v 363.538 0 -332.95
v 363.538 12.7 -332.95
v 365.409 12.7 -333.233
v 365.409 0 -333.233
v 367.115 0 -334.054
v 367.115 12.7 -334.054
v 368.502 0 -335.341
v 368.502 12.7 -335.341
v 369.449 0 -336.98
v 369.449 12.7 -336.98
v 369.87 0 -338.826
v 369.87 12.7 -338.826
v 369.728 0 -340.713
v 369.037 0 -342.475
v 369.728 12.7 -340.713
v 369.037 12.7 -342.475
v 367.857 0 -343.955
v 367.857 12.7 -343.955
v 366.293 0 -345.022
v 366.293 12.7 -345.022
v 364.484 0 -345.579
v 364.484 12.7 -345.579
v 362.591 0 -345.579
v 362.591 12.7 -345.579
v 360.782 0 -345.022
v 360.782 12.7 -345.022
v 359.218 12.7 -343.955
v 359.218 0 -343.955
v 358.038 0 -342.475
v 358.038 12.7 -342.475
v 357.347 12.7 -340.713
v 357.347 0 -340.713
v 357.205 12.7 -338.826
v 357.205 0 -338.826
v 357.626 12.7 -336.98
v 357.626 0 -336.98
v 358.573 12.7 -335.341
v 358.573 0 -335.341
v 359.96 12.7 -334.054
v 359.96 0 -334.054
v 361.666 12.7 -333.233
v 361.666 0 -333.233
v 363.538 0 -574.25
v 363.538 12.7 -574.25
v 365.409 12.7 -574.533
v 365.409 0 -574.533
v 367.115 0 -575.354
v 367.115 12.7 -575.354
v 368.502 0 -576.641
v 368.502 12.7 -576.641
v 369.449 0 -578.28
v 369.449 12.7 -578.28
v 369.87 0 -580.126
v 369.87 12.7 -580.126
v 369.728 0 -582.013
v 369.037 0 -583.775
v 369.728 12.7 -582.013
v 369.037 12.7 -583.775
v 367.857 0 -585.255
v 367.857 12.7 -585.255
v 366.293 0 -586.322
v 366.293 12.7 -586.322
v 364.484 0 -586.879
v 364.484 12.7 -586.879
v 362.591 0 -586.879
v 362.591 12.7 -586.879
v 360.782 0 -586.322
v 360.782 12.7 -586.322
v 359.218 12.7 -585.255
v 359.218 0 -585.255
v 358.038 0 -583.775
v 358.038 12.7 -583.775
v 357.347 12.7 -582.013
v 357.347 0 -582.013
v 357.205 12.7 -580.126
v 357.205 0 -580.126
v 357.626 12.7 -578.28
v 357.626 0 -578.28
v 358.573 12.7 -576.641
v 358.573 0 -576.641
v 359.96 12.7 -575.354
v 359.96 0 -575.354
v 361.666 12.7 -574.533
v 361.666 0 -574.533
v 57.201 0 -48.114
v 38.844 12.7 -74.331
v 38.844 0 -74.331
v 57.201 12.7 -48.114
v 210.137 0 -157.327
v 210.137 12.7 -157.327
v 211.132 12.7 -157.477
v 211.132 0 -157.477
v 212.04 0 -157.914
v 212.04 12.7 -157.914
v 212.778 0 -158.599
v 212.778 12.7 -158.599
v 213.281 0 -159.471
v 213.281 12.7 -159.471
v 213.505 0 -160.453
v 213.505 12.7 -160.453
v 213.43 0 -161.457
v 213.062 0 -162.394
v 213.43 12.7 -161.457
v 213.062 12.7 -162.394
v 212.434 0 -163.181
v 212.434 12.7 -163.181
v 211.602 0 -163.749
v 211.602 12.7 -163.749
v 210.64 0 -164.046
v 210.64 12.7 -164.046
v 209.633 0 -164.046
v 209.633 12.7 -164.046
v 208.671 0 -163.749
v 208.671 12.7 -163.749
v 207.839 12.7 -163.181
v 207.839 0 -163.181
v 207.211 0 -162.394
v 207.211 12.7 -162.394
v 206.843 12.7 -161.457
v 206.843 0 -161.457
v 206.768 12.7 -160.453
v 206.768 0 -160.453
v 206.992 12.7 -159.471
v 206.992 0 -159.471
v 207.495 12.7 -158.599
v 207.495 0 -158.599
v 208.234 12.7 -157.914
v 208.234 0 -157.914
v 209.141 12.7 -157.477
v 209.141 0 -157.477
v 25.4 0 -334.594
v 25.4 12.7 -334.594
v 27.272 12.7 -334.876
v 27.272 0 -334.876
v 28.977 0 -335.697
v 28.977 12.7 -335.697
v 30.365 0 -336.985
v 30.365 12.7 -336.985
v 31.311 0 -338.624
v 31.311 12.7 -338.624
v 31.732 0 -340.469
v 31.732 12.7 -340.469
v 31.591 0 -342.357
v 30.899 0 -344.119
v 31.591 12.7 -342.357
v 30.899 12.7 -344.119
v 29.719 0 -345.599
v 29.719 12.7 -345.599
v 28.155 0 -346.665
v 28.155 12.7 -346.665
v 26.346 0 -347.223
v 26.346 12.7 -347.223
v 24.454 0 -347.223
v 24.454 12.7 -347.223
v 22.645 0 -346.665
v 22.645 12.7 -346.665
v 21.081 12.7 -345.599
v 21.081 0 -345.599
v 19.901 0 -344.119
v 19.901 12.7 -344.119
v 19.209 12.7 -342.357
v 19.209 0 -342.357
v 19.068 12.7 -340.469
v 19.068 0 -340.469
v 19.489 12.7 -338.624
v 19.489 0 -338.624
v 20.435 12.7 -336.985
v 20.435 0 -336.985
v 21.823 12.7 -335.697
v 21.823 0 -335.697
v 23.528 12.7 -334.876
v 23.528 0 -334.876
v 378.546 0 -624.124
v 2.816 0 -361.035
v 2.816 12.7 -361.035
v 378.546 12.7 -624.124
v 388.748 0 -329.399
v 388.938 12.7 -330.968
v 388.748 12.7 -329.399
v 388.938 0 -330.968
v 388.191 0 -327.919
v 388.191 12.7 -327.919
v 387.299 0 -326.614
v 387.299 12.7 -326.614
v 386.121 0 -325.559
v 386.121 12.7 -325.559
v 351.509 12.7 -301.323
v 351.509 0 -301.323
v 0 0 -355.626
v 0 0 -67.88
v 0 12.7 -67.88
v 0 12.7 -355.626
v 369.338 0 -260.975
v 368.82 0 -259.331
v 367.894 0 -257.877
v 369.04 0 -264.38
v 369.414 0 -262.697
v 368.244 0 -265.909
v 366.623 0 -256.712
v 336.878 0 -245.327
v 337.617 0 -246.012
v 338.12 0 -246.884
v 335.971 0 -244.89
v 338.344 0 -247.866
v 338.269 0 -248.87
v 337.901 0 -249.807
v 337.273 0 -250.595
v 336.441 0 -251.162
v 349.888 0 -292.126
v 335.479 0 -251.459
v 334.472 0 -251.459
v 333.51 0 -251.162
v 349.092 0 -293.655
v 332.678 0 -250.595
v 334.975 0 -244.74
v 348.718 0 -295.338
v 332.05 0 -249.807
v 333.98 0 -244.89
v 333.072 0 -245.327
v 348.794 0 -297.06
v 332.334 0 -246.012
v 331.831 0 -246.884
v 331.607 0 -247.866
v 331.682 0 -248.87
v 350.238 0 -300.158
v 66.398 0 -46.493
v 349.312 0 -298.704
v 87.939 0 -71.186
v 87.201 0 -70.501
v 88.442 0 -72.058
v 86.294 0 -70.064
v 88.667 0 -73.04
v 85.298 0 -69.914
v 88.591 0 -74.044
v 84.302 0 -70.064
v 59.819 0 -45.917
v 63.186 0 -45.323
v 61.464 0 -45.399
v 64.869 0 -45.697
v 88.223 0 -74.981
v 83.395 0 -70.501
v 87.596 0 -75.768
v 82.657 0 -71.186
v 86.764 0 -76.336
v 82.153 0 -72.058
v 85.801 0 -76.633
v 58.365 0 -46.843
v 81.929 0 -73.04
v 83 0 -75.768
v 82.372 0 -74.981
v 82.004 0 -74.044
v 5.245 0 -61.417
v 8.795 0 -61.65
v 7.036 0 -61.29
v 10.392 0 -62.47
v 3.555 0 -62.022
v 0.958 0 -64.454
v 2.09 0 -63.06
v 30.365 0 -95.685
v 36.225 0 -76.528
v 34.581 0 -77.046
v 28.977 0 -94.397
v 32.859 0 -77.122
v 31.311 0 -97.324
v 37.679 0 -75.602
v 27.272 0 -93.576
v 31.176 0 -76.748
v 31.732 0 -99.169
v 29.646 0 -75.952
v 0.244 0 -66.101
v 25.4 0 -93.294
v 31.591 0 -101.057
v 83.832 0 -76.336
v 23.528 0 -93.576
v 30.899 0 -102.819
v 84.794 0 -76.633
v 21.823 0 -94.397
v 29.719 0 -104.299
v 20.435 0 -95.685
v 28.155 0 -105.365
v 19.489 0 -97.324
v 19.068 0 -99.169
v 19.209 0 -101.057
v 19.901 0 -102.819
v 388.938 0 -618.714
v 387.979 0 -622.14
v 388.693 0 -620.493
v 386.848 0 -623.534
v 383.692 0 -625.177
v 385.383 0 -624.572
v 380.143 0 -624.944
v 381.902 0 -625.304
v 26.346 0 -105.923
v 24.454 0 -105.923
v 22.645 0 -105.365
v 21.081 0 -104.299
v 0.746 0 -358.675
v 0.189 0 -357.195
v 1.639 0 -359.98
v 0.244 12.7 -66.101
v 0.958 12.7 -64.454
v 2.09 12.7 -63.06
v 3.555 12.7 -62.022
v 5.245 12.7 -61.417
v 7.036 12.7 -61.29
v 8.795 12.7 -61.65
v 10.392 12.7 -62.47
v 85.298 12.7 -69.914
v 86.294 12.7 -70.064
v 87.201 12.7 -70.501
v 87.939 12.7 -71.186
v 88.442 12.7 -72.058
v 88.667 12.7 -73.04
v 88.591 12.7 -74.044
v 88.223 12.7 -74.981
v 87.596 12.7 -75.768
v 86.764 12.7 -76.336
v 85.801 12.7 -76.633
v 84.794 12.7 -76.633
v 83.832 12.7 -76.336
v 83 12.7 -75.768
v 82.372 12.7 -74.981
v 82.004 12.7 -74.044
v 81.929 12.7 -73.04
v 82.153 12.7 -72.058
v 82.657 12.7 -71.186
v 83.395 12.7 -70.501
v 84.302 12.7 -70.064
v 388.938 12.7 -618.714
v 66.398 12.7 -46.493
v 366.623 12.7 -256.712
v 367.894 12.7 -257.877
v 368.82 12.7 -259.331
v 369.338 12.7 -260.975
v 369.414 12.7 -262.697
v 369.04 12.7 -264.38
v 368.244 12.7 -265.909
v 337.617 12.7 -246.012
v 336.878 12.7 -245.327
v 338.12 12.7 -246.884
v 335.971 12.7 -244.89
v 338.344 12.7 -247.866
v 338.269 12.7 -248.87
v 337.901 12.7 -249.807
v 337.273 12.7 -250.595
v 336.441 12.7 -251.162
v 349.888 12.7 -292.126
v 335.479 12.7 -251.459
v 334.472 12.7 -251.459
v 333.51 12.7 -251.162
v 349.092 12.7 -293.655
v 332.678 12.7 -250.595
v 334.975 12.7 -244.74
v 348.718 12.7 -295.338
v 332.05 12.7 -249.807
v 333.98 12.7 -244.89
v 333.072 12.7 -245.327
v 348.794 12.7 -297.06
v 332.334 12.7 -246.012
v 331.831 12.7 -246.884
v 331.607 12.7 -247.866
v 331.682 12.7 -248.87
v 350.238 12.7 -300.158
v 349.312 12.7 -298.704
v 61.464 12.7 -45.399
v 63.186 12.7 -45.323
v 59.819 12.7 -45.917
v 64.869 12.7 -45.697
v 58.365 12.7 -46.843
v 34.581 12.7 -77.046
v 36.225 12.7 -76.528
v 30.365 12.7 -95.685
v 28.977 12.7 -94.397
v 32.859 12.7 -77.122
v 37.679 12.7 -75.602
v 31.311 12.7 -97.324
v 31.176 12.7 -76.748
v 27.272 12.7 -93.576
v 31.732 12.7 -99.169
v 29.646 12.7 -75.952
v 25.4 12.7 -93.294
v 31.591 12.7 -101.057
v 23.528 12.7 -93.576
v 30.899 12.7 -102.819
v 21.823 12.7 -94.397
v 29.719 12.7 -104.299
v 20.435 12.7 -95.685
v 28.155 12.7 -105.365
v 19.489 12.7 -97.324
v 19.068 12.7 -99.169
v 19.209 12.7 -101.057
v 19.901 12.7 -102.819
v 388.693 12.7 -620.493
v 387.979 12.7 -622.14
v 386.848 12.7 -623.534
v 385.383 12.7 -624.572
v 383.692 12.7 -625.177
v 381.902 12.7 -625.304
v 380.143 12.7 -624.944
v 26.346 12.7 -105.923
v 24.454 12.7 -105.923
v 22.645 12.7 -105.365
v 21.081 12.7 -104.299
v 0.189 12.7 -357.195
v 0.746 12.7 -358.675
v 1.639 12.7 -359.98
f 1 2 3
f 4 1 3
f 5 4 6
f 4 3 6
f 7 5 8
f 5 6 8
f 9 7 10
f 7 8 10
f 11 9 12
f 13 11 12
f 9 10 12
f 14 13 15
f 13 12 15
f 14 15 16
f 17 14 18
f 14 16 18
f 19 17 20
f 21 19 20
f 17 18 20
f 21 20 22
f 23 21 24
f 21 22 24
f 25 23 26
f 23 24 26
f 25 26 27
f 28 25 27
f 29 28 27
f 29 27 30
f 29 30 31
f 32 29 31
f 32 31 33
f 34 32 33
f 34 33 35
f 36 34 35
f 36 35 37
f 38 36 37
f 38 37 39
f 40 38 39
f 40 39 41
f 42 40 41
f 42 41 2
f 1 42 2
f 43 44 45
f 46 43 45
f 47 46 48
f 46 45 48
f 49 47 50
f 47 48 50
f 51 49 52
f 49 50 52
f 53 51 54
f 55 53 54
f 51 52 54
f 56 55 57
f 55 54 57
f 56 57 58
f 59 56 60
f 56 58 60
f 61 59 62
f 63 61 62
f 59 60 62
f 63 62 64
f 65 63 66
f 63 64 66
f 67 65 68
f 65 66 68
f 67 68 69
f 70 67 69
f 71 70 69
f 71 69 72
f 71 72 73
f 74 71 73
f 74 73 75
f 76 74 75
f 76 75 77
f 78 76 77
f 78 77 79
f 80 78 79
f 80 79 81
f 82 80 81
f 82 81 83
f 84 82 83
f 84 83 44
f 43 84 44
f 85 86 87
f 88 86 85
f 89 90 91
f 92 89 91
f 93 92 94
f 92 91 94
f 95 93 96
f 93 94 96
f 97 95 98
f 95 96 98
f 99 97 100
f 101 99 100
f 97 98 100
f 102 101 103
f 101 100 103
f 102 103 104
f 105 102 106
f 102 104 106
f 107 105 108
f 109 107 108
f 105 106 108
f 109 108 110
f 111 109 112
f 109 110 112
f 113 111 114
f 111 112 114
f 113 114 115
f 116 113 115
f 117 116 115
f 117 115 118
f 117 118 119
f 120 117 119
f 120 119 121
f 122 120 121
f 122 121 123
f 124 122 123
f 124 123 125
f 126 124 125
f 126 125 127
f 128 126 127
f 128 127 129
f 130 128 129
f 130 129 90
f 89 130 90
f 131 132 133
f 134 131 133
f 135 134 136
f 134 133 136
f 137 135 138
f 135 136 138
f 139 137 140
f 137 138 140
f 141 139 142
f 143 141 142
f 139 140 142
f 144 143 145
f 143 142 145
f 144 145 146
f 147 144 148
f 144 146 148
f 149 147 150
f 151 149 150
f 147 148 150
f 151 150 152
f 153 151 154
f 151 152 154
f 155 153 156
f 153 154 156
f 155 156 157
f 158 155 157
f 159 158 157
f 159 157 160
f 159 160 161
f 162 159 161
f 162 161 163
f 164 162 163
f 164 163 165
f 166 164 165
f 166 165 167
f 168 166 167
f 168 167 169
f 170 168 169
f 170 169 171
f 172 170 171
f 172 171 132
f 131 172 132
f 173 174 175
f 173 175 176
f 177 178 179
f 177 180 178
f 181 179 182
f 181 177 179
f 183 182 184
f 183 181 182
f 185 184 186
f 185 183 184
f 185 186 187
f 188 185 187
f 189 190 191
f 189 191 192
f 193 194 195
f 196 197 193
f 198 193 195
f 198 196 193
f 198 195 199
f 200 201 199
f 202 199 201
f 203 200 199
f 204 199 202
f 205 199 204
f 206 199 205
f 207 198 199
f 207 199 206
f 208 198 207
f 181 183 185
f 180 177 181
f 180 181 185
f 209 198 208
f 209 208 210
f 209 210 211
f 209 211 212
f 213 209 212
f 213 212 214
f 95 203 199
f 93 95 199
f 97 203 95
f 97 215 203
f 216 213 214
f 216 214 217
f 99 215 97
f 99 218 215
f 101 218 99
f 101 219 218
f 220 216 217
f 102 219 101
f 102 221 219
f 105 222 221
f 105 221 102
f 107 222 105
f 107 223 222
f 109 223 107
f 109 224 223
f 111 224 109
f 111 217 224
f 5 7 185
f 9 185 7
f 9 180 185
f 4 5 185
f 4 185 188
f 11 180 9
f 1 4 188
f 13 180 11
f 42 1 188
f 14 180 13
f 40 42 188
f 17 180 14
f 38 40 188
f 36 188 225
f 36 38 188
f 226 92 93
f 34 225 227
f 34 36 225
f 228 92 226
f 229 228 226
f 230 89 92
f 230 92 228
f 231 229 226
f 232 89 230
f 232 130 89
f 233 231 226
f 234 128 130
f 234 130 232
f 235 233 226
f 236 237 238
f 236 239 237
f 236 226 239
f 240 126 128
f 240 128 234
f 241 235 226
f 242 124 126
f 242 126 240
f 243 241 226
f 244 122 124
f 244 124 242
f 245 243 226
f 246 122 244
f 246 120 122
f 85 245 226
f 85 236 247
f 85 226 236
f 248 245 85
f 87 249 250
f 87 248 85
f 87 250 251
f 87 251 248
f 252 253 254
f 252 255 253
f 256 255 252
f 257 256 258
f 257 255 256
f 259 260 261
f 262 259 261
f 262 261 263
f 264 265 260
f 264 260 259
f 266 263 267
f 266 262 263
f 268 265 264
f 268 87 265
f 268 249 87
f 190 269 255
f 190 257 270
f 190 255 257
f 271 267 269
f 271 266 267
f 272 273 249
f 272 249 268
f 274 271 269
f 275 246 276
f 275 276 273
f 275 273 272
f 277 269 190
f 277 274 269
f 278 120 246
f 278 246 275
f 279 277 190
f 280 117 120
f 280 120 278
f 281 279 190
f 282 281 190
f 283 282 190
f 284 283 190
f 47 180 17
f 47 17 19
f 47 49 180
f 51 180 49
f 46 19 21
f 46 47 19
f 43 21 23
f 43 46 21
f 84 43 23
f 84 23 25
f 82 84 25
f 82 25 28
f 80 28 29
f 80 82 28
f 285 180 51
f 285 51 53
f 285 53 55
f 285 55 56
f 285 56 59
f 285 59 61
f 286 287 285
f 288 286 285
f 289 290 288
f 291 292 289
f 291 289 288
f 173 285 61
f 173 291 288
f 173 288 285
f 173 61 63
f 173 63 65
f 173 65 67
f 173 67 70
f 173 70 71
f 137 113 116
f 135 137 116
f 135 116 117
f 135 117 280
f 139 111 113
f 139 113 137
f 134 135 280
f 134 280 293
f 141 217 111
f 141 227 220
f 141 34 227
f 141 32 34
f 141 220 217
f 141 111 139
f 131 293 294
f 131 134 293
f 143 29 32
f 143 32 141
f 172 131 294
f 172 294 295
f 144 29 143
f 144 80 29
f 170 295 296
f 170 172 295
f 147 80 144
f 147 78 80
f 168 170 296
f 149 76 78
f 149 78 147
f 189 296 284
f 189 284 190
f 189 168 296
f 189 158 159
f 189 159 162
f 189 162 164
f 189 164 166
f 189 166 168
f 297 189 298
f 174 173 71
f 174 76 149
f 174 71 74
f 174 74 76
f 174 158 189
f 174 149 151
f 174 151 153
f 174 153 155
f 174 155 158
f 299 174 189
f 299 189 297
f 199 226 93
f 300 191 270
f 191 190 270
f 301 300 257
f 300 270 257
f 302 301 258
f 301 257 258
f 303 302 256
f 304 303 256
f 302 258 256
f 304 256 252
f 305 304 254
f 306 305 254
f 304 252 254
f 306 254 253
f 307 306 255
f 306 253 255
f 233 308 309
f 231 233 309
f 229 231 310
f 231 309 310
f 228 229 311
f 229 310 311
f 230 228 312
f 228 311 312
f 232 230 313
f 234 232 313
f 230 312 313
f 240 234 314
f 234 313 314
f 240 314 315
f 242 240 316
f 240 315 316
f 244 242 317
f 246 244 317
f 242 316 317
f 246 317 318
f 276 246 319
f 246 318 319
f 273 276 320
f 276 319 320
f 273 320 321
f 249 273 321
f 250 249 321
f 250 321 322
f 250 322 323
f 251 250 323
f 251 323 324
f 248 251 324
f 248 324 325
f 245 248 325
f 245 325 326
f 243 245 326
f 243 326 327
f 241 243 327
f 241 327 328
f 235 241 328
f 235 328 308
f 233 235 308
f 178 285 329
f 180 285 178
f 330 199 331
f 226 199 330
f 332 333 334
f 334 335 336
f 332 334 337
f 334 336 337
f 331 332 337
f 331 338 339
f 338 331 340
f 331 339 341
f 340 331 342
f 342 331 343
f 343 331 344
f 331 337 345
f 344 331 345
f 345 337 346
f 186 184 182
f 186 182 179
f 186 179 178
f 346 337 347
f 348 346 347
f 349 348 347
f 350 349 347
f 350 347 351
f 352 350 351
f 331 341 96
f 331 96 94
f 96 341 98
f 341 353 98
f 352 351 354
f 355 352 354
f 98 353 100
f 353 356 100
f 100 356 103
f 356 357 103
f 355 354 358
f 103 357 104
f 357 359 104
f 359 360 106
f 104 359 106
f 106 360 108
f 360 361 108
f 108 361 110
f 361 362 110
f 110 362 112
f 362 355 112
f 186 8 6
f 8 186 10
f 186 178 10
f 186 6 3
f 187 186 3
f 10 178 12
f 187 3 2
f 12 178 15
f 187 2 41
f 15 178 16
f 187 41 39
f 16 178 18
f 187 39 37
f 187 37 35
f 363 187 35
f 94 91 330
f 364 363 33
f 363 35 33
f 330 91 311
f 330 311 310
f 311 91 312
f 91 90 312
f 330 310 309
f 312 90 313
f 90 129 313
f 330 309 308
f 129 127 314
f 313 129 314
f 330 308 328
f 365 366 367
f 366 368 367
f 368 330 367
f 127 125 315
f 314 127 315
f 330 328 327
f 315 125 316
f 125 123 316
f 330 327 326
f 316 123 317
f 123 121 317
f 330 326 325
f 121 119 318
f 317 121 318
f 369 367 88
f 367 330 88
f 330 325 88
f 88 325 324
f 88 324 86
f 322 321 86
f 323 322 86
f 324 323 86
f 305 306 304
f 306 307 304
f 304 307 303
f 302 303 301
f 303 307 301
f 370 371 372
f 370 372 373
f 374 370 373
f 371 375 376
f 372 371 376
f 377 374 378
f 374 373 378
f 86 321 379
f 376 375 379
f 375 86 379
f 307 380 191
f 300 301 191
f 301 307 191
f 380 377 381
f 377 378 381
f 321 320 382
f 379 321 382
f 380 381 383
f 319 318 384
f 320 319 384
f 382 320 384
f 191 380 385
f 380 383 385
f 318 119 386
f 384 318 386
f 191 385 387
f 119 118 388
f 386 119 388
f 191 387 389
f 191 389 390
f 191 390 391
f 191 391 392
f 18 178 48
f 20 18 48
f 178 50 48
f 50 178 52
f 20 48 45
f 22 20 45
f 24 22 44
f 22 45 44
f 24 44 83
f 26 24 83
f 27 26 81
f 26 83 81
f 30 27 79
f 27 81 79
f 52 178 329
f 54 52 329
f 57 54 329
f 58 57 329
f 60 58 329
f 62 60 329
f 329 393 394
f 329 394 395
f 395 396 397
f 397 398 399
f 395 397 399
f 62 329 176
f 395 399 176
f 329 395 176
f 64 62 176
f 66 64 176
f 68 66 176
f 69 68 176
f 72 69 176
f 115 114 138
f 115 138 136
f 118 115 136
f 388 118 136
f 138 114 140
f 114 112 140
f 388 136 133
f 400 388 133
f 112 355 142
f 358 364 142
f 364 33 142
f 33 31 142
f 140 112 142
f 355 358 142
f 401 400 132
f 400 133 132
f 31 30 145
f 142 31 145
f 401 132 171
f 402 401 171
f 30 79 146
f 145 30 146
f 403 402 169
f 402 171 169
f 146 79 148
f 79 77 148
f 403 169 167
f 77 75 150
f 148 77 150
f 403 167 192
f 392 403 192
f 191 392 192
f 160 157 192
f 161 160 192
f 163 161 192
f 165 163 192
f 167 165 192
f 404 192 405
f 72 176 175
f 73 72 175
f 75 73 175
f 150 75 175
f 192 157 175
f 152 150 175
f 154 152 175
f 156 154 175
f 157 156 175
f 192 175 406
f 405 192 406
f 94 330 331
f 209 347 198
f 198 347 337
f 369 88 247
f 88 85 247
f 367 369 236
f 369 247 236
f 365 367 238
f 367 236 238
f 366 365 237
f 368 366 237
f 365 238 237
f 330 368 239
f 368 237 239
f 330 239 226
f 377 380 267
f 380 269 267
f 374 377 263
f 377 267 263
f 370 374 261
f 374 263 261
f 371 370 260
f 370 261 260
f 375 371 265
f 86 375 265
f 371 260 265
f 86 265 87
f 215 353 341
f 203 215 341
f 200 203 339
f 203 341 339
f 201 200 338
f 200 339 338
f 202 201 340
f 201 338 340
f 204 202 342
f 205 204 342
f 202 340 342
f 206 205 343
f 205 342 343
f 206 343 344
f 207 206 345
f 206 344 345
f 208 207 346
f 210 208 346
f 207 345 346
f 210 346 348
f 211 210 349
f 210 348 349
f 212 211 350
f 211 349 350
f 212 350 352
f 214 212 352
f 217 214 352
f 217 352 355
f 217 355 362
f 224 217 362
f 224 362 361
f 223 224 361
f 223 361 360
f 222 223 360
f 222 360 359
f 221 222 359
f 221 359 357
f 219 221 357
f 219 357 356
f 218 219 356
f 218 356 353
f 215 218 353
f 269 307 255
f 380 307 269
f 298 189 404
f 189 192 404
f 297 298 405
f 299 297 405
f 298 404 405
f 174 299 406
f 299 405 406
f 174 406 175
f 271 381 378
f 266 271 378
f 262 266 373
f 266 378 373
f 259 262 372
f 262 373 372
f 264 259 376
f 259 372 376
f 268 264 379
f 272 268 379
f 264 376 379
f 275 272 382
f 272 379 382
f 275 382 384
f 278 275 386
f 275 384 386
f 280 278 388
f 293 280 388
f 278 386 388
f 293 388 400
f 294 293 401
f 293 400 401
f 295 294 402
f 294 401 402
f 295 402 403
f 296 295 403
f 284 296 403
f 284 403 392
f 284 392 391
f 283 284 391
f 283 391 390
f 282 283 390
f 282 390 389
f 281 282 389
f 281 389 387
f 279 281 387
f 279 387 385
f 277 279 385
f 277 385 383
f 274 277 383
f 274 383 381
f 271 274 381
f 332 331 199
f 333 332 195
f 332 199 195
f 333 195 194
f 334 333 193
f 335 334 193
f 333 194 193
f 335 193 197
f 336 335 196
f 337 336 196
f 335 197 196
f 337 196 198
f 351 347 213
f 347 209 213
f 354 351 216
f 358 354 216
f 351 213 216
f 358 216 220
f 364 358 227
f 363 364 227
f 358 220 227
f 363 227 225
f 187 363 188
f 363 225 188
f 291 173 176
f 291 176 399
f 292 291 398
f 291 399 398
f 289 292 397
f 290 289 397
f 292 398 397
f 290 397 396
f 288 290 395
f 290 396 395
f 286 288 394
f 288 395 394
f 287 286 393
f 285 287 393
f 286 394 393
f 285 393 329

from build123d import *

# Parameters (mm, degrees)
BOSS_EXTRUDE1_DEPTH = 12.7
CUT_EXTRUDE1_DEPTH  = 742.687355867
SKETCH3_R           = 3.3782
SKETCH3_R_2         = 6.35
CUT_EXTRUDE2_DEPTH  = 742.687355867
FILLET1_R           = 6.604


with BuildPart() as part:
    # Sketch1 → Boss-Extrude1 (new body)
    with BuildSketch(Plane(origin=(0, 0, 0), x_dir=(1, 0, 0), z_dir=(0, 1, 0))):
        Polygon((0, 0), (0, 359.06343047), (388.9375, 631.400399863), (388.9375, 272.336969392), align=None)
    extrude(amount=BOSS_EXTRUDE1_DEPTH)

    # Sketch2 → Cut-Extrude1 (cut, through all)
    with BuildSketch(Plane(origin=(0, 12.7, 0), x_dir=(1, 0, 0), z_dir=(0, 1, 0))):
        Polygon((35.056131737, 79.74022841), (60.988669577, 42.704726183), (0, 0), (0, 55.193660707), align=None)
        Polygon((388.9375, 327.5306301), (346.099711846, 297.535287914), (372.032249686, 260.499785687), (388.9375, 272.336969392), align=None)
    extrude(amount=-CUT_EXTRUDE1_DEPTH, mode=Mode.SUBTRACT)

    # Sketch3 → Cut-Extrude2 (cut, through all)
    with BuildSketch(Plane(origin=(0, 12.7, 0), x_dir=(1, 0, 0), z_dir=(0, 1, 0))):
        with Locations(Location((210.136591483, 160.705083027, 0), (0, 0, 270))):
            Circle(SKETCH3_R)
        with Locations(Location((334.975363032, 248.118131927, 0), (0, 0, 270))):
            Circle(SKETCH3_R)
        with Locations(Location((85.297819933, 73.292034127, 0), (0, 0, 270))):
            Circle(SKETCH3_R)
        with Locations(Location((25.4, 99.643660707, 0), (0, 0, 270))):
            Circle(SKETCH3_R_2)
        with Locations(Location((25.4, 340.943660707, 0), (0, 0, 270))):
            Circle(SKETCH3_R_2)
        with Locations(Location((363.5375, 339.300399863, 0), (0, 0, 270))):
            Circle(SKETCH3_R_2)
        with Locations(Location((363.5375, 580.600399863, 0), (0, 0, 270))):
            Circle(SKETCH3_R_2)
    extrude(amount=-CUT_EXTRUDE2_DEPTH, mode=Mode.SUBTRACT)

    # Fillet1
    fillet1_edges = [part.edges().sort_by_distance(p)[0] for p in [
        (0, 6.35, -55.193660707),
        (35.056131737, 6.35, -79.74022841),
        (60.988669577, 6.35, -42.704726183),
        (388.9375, 6.35, -327.5306301),
        (372.032249686, 6.35, -260.499785687),
        (346.099711846, 6.35, -297.535287914),
        (0, 6.35, -359.06343047),
        (388.9375, 6.35, -631.400399863),
    ]]
    fillet(fillet1_edges, radius=FILLET1_R)


solid = part.part
